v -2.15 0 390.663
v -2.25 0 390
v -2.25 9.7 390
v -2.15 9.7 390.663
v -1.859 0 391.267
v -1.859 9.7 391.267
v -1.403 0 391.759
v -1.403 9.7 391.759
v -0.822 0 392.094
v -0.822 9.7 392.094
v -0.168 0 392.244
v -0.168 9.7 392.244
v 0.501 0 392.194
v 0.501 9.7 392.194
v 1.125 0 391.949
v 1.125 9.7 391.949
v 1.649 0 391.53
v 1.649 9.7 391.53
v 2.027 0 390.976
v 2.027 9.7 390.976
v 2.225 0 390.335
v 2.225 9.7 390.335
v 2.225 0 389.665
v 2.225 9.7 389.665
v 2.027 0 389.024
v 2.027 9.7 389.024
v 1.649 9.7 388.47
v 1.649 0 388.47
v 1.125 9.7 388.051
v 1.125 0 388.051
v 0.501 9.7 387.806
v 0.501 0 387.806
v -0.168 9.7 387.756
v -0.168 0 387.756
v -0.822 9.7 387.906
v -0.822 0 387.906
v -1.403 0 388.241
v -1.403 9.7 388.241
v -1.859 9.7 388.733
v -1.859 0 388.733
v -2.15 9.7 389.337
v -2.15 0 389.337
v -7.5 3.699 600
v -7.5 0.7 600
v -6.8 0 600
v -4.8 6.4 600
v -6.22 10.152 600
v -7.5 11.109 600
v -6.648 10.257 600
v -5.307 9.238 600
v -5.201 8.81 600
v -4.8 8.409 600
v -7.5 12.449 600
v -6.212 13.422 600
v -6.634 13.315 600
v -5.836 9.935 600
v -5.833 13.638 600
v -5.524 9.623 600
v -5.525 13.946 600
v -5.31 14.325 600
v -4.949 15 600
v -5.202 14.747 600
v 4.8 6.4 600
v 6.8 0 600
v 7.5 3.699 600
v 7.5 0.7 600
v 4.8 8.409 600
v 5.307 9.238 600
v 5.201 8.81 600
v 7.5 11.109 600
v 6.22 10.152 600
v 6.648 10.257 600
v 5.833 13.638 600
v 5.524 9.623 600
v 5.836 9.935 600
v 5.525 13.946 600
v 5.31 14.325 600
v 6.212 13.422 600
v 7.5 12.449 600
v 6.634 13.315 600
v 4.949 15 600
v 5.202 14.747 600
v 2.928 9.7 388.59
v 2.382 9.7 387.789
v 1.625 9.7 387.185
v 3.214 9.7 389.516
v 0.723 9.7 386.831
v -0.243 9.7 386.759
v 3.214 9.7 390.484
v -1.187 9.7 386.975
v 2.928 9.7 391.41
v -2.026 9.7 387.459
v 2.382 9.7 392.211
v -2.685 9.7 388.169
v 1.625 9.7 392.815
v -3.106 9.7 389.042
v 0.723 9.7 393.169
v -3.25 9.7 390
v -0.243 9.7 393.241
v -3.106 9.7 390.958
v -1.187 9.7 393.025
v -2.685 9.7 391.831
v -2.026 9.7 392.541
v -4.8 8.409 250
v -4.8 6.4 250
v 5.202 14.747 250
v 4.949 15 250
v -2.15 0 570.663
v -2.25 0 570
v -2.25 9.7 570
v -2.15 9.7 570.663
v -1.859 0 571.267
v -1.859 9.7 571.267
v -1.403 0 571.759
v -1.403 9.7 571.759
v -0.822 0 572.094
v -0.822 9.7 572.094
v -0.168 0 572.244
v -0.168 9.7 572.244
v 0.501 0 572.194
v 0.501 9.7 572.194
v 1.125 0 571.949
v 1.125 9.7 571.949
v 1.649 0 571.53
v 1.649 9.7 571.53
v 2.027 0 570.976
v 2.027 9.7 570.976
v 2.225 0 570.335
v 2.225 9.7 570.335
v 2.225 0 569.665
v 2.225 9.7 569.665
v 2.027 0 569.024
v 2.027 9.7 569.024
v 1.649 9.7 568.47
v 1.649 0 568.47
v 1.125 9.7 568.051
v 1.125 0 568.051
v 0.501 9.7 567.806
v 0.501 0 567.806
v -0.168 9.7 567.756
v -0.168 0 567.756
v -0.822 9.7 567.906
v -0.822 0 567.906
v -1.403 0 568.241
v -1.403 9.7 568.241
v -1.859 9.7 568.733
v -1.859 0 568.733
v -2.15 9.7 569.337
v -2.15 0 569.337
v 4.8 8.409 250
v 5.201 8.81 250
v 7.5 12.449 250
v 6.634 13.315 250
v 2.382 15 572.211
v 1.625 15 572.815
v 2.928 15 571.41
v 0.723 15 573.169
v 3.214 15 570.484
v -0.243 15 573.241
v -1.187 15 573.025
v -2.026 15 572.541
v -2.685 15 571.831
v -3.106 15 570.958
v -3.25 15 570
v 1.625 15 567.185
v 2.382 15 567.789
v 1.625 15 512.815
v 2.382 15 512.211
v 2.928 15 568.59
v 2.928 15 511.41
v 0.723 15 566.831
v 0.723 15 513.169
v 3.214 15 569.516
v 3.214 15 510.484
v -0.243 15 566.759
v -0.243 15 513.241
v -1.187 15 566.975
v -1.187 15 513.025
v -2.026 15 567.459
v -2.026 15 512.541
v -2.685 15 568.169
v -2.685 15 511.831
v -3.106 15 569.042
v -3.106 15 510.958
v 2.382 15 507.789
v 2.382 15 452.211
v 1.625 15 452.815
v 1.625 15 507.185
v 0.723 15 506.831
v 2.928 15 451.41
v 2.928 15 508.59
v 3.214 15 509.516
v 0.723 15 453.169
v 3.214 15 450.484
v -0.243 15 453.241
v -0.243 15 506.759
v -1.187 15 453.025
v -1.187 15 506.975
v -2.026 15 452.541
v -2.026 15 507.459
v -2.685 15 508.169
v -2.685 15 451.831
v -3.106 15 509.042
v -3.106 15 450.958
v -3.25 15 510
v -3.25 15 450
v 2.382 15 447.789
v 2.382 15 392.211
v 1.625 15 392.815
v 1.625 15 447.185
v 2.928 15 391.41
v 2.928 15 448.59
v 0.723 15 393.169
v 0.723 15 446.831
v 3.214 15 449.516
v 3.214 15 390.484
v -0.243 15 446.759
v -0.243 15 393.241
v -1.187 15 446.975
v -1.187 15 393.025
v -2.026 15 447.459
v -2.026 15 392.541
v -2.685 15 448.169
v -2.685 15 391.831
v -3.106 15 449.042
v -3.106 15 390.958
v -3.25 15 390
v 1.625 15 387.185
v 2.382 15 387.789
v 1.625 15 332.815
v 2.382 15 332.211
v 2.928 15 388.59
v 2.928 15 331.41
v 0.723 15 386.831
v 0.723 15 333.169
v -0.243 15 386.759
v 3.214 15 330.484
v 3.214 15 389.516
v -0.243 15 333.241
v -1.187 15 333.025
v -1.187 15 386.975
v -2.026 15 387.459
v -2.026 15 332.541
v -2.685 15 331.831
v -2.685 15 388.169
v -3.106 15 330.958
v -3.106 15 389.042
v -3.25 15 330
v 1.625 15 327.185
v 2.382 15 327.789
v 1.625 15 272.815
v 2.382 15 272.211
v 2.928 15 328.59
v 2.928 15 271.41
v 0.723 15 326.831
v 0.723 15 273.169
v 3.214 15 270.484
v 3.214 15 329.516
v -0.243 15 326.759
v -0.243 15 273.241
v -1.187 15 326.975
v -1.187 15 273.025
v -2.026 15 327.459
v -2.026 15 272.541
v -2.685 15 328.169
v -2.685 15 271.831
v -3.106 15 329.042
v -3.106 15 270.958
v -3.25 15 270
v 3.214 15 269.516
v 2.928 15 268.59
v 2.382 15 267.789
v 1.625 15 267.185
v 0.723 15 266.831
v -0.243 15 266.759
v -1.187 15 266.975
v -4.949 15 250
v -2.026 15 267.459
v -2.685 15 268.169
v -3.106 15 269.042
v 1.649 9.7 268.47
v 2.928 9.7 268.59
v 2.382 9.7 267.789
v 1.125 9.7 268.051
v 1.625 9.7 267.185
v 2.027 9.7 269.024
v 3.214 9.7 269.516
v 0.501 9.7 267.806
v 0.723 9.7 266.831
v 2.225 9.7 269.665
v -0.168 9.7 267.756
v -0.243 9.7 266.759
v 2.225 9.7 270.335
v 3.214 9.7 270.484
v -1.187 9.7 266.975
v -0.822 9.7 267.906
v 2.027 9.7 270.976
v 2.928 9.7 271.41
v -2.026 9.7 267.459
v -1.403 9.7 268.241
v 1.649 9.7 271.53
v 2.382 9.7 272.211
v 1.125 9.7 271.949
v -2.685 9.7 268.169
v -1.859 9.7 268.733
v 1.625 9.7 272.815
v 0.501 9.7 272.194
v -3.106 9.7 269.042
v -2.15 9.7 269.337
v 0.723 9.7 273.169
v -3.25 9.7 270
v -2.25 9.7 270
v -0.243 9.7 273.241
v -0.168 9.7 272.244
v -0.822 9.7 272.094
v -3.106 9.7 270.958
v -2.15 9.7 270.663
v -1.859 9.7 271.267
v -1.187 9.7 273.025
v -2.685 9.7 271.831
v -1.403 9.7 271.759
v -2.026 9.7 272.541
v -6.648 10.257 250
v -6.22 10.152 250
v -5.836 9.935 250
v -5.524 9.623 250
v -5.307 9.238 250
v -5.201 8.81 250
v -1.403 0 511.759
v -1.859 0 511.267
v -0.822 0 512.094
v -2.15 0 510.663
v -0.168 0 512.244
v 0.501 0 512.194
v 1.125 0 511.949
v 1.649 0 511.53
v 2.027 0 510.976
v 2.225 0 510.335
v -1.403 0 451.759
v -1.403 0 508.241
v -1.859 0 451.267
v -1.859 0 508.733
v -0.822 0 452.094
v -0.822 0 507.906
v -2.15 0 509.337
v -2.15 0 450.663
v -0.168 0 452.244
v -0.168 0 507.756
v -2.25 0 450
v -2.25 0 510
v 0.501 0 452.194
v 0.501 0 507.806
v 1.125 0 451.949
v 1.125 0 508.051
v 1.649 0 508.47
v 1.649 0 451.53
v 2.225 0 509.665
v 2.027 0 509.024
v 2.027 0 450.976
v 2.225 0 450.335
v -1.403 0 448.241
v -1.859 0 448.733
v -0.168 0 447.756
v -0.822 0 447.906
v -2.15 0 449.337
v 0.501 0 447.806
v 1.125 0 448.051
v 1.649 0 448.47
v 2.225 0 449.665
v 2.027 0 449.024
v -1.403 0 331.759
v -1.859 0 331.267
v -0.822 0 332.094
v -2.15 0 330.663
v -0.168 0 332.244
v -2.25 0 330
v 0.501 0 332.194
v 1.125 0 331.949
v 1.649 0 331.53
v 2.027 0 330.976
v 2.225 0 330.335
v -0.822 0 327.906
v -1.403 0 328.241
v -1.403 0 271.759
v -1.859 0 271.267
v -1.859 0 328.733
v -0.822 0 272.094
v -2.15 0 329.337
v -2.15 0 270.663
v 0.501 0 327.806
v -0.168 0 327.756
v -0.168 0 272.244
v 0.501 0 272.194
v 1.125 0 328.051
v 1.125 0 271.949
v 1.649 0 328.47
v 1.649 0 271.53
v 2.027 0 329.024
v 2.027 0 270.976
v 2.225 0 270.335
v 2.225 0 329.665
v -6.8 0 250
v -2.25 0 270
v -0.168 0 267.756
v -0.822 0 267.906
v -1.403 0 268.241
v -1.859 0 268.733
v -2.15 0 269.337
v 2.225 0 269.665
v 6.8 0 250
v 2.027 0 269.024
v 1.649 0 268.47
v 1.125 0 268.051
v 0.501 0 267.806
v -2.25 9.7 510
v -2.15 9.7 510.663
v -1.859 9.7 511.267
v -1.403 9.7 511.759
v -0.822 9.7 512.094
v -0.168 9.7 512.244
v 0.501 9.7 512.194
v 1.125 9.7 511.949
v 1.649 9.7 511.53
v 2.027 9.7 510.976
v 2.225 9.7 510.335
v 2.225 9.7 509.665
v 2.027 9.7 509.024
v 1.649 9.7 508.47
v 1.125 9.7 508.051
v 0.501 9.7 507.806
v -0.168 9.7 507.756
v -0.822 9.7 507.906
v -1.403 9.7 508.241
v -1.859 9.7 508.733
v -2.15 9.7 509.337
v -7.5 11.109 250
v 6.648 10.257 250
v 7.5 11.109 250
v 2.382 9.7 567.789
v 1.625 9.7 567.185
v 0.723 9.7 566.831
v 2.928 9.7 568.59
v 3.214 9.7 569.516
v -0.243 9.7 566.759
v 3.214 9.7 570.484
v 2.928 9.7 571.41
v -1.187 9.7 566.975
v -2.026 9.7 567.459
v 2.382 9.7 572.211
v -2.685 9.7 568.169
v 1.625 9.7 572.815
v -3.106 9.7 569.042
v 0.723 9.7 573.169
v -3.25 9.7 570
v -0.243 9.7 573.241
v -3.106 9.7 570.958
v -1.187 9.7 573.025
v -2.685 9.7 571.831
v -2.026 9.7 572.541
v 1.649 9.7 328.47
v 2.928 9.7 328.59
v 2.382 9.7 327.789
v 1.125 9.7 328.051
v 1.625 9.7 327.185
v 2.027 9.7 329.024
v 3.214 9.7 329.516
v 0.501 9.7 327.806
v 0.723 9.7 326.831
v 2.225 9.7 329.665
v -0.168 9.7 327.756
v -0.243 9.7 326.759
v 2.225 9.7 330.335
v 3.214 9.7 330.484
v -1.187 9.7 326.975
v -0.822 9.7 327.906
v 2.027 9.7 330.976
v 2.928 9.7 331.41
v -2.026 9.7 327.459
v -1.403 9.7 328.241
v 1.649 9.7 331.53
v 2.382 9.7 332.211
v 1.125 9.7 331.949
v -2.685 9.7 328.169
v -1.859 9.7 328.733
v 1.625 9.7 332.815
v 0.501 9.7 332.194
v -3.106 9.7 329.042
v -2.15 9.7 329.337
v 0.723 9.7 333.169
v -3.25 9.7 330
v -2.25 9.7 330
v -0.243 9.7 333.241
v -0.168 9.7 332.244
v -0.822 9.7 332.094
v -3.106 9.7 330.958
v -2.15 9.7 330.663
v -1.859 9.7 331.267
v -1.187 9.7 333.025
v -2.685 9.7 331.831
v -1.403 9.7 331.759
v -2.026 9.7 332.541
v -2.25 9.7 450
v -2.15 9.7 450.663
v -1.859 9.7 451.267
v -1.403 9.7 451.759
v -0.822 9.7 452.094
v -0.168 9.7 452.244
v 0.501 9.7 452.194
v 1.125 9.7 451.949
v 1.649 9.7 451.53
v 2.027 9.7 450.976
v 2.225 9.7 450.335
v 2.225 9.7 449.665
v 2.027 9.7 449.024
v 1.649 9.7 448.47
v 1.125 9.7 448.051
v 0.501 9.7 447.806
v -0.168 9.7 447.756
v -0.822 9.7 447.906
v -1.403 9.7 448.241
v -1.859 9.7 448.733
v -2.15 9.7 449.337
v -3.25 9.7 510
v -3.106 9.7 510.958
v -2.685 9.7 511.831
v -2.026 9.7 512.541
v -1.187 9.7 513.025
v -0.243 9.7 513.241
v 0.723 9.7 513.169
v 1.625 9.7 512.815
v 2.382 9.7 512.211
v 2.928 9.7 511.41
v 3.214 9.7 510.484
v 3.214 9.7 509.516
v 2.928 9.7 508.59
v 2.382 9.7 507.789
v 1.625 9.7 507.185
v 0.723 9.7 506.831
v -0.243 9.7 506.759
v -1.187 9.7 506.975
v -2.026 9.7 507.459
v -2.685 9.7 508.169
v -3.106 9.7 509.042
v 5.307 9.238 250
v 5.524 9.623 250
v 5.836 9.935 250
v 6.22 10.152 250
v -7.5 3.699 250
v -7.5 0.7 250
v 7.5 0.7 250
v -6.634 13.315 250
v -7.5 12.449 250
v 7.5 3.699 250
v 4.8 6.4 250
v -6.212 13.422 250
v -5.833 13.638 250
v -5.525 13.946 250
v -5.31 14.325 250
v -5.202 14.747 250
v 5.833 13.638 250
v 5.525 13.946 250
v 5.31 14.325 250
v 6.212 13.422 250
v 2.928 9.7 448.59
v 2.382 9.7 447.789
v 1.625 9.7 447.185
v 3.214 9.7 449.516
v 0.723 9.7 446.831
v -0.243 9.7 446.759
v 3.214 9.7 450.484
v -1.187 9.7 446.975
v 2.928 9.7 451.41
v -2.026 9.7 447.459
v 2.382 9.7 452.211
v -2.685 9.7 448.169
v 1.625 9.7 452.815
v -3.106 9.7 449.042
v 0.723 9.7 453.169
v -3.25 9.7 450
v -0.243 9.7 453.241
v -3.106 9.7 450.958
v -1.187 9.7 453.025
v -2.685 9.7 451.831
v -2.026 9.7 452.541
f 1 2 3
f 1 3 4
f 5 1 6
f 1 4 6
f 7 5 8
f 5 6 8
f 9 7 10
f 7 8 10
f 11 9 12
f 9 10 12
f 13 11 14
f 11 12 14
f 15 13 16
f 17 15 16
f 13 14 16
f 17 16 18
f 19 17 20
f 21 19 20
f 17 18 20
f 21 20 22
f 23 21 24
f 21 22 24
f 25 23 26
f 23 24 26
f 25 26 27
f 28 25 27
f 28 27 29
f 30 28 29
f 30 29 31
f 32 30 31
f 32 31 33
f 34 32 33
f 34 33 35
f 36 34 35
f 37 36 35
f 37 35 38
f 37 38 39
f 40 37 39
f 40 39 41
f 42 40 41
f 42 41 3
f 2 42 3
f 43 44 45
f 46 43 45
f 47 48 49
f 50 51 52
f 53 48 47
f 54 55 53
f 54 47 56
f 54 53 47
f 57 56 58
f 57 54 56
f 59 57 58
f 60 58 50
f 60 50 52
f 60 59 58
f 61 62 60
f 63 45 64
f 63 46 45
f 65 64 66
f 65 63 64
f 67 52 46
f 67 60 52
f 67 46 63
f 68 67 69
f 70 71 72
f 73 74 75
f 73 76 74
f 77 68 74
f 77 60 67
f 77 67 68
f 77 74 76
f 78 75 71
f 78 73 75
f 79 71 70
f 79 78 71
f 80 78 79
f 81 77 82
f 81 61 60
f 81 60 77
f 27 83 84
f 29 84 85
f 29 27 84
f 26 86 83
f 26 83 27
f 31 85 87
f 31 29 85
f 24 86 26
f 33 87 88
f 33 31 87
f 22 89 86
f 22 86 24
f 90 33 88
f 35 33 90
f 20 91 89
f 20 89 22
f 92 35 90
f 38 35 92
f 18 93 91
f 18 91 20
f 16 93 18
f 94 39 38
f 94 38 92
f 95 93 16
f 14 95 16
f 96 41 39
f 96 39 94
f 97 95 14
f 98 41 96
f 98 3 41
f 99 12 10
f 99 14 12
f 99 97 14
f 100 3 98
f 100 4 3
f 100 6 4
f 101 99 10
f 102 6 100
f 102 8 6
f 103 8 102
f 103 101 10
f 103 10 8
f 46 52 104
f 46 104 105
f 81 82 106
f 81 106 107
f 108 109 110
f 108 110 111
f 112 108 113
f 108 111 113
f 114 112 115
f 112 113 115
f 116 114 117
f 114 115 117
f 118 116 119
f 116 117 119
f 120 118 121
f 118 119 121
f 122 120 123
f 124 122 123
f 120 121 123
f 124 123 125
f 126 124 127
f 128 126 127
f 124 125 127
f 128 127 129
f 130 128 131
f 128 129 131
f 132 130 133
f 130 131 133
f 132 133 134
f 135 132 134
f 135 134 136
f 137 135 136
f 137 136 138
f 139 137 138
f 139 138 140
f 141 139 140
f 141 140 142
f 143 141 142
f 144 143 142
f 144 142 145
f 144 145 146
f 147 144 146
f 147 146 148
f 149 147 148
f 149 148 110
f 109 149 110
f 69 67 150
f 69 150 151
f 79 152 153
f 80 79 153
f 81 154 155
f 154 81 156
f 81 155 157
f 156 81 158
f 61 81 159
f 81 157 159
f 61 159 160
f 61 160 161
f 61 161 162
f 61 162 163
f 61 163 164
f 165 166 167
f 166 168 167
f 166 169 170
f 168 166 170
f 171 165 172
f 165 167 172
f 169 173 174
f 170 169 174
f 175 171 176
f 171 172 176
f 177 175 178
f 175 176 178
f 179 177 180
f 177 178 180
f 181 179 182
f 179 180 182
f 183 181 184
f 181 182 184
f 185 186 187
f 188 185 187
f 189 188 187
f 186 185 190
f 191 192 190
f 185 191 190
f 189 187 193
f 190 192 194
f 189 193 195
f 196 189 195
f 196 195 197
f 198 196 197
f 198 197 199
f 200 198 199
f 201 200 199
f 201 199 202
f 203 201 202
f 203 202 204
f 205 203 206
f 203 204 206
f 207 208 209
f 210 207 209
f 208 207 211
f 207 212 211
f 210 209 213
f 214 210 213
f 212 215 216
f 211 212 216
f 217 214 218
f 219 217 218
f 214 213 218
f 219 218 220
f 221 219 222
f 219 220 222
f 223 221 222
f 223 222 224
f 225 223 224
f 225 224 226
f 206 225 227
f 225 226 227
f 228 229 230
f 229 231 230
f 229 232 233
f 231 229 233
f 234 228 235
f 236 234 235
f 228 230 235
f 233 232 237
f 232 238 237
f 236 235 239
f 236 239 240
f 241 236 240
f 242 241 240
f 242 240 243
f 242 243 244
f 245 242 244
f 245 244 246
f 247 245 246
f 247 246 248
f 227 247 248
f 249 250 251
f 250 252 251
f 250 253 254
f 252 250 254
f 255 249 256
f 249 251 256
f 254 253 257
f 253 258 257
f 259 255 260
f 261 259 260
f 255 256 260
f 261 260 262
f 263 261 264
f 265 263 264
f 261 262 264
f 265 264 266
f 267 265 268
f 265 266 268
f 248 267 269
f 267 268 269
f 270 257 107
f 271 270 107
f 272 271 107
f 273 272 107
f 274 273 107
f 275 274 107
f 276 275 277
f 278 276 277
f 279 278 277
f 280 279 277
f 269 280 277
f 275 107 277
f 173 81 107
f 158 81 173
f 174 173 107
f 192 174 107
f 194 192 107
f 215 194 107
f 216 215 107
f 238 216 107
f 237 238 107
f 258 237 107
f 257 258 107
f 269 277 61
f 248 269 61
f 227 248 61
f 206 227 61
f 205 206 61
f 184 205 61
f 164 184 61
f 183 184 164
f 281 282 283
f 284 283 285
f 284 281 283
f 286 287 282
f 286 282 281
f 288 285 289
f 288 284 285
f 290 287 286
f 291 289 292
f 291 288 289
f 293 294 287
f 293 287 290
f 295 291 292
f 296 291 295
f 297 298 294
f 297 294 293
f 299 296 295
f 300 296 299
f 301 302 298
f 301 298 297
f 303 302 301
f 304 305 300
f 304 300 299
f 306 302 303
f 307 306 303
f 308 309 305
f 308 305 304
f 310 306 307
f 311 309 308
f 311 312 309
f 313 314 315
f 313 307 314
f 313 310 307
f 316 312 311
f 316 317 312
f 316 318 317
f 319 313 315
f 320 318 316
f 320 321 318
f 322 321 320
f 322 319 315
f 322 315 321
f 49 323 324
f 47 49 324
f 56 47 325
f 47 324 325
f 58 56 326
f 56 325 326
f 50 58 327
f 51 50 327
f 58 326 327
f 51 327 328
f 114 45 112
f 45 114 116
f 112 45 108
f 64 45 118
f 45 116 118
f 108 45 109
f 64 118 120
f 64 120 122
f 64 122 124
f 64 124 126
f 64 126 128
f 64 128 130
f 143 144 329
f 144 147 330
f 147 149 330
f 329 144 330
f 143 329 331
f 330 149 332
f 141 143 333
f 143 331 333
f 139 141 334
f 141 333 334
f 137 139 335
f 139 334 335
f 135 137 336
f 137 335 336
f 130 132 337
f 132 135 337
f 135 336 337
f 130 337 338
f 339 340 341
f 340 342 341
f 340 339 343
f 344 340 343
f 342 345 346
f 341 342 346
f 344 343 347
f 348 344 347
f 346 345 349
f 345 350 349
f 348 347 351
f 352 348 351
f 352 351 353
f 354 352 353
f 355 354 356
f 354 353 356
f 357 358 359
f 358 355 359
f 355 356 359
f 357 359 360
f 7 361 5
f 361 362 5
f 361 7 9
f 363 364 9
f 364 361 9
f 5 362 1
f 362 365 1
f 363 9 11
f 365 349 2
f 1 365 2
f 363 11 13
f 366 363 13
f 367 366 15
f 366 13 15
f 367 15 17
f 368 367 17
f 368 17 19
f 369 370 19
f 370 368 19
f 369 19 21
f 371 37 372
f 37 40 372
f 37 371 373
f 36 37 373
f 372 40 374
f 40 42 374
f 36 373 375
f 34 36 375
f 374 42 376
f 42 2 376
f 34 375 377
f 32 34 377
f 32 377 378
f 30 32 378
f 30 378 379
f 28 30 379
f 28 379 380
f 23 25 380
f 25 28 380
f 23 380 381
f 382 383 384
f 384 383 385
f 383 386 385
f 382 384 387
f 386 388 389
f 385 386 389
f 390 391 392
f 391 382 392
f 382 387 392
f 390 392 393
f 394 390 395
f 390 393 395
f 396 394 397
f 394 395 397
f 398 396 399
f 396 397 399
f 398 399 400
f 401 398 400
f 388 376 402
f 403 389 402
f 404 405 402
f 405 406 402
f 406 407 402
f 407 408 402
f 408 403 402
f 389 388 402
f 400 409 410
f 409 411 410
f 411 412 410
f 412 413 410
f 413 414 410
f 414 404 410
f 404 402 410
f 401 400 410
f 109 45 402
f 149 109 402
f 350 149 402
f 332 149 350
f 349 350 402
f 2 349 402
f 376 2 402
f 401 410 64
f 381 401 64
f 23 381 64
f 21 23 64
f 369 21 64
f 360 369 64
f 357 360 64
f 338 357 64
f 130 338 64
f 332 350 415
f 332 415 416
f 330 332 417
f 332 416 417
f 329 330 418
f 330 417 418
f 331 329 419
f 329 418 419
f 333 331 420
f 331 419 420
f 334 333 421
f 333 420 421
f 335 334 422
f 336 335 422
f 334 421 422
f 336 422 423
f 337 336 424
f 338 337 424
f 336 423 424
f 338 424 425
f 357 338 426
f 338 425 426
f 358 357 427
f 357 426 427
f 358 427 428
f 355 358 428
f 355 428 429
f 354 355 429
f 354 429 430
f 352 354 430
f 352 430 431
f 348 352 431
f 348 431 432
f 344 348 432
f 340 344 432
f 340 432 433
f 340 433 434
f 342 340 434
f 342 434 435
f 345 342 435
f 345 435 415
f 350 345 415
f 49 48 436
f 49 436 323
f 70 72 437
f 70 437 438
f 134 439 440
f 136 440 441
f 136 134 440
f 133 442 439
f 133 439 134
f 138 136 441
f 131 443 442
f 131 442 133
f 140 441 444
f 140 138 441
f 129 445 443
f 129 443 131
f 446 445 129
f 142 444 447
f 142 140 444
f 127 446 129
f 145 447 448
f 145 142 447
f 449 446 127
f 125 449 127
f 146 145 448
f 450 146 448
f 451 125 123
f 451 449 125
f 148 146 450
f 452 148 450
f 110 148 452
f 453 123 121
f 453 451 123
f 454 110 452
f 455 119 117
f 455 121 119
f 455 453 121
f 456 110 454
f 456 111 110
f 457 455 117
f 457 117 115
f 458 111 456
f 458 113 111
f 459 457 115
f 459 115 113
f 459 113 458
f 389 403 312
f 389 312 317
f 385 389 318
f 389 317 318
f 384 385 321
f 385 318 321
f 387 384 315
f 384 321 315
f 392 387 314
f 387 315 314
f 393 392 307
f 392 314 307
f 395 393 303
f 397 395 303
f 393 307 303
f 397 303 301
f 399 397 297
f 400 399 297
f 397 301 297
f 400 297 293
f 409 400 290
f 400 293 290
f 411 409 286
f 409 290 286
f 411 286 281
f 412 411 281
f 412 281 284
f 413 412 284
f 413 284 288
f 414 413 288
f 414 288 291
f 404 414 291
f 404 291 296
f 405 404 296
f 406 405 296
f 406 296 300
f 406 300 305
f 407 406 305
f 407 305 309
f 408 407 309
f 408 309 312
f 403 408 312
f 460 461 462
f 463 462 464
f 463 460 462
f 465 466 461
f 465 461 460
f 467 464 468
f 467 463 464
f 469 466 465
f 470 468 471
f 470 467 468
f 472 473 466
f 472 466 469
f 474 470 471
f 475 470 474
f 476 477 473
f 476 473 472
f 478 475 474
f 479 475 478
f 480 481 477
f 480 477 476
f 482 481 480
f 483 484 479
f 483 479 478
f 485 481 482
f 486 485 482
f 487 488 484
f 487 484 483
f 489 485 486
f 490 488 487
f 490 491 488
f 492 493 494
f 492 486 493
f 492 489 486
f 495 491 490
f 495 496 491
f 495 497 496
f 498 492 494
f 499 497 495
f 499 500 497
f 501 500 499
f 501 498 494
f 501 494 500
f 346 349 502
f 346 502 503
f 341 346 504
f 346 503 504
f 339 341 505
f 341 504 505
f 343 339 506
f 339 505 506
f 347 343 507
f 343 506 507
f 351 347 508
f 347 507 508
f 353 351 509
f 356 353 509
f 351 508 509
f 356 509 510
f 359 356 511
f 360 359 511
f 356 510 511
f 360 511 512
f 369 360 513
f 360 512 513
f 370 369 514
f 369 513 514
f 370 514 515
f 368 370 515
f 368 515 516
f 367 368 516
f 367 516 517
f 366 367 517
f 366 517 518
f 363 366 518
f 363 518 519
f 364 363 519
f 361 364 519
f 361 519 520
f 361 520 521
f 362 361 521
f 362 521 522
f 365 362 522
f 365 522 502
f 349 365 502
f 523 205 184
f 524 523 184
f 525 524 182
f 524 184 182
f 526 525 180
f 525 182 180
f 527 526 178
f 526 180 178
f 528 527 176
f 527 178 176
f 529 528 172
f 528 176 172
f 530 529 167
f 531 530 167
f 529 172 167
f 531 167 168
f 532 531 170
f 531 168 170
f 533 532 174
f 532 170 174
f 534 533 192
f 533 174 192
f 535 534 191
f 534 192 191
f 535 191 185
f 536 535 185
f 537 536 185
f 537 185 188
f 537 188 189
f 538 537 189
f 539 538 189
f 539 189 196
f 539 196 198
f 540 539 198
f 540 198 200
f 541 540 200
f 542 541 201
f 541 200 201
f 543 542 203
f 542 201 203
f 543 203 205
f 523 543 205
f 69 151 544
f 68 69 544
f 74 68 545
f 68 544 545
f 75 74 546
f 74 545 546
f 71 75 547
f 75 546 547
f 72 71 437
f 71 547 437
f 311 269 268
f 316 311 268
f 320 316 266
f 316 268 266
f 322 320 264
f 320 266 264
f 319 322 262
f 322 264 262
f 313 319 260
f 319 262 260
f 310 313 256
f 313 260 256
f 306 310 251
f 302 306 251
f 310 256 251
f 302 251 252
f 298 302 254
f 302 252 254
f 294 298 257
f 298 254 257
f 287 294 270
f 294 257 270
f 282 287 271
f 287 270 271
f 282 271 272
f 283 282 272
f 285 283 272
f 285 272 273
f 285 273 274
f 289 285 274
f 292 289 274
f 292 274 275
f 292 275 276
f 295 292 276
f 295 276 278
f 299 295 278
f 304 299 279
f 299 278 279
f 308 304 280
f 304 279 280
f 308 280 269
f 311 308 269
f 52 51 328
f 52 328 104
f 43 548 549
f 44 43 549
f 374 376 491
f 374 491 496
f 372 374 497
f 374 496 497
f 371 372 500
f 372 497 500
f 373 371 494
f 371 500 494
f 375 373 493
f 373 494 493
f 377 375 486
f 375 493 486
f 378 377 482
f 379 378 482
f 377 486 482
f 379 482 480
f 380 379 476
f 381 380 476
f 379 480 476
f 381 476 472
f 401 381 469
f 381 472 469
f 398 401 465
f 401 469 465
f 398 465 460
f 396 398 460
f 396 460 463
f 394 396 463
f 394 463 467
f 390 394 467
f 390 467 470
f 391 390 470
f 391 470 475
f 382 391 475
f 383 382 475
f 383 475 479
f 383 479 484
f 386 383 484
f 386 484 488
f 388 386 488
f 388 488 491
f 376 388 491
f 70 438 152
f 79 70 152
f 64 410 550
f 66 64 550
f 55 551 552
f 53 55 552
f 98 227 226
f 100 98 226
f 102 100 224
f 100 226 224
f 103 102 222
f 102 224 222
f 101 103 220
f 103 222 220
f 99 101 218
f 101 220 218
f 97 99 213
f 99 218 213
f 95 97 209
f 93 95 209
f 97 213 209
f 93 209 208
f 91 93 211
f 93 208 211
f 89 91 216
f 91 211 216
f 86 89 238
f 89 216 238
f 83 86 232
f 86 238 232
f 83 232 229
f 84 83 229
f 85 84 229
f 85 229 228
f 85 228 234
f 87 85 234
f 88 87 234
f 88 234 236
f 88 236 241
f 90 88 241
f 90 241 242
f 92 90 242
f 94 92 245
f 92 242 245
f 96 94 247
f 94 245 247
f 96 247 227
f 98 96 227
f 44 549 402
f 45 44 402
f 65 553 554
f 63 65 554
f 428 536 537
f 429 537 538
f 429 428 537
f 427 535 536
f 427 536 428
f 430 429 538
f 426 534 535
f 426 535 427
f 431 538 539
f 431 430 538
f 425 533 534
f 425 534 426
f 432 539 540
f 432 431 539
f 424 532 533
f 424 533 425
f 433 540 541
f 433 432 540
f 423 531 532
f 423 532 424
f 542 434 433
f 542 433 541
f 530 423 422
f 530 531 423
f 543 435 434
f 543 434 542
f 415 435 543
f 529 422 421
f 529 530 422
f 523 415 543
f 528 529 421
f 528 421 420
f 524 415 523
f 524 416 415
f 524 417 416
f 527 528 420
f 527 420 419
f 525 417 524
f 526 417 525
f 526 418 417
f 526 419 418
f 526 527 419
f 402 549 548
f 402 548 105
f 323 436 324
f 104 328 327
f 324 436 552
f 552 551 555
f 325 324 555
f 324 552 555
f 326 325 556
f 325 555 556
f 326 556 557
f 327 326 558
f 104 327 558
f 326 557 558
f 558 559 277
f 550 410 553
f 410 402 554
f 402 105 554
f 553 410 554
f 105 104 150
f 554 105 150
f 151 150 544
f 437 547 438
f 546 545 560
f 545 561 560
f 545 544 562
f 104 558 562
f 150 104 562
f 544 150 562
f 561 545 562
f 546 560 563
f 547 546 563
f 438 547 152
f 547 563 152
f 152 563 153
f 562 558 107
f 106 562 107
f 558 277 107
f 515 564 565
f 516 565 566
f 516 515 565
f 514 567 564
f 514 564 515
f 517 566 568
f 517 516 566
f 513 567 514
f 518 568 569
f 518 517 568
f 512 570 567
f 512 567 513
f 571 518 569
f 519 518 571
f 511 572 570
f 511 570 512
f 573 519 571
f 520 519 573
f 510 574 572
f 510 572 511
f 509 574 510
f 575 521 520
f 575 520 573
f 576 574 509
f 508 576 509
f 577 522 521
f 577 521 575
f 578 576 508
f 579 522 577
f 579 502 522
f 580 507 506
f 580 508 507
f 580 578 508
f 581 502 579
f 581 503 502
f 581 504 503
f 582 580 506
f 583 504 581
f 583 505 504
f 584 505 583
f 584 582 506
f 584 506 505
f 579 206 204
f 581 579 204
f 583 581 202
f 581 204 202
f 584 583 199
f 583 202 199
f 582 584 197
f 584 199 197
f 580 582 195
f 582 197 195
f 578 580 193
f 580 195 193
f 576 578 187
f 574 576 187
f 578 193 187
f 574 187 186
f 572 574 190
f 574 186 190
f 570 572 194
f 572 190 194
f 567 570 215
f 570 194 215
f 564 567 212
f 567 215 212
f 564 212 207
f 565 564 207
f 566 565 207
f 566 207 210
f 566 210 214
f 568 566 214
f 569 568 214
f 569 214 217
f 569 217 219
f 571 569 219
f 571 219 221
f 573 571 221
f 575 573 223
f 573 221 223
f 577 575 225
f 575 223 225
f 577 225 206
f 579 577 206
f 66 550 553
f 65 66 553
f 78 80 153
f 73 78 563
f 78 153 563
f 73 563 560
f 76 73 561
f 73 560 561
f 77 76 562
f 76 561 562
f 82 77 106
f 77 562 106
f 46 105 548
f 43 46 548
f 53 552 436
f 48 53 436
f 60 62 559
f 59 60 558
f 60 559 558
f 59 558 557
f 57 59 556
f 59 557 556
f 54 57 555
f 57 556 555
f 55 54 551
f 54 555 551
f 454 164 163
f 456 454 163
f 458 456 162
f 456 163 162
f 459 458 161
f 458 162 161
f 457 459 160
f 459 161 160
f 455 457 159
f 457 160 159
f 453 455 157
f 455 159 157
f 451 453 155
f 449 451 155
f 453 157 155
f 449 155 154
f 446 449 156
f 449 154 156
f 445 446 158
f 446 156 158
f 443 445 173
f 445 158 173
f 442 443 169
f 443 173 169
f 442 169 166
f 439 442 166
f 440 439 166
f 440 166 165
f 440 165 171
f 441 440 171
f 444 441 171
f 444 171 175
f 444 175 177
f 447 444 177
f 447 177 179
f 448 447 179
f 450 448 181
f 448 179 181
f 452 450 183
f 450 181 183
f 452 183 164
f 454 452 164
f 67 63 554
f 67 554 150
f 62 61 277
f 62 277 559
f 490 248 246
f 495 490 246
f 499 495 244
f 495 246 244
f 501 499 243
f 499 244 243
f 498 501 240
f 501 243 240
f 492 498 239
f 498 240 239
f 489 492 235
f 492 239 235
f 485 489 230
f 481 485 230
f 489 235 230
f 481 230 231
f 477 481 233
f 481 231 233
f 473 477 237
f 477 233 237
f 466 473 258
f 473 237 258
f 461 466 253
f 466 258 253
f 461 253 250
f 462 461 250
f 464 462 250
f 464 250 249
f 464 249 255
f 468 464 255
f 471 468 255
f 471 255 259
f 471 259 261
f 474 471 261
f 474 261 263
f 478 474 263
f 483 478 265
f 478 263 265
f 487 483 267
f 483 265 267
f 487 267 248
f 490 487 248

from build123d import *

# Parameters (mm, degrees)
EXTRUDE_1_DEPTH     = 600
SKETCH_2_R          = 3.25
CUT_EXTRUDE_1_DEPTH = 5.3
SKETCH_3_R          = 2.25
CUT_EXTRUDE_2_DEPTH = 601.125270256
SKETCH1_W           = 15
SKETCH1_H           = 250
CUT_EXTRUDE1_DEPTH  = 100


with BuildPart() as part:
    # Model → Бобышка-Вытянуть1 (new body)
    with BuildSketch(Plane.XY):
        with BuildLine():
            Line((6.8, 0), (7.5, 0.7))
            Line((7.5, 0.7), (7.5, 3.6994391))
            Line((7.5, 3.6994391), (4.7998047, 6.3996344))
            Line((4.7998047, 6.3996344), (4.7998047, 8.409149262))
            Line((4.7998047, 8.409149262), (5.20075838, 8.810103152))
            ThreePointArc((5.20075838, 8.810103152), (5.668922208, 9.789261508), (6.648080611, 10.257425237))
            Line((6.648080611, 10.257425237), (7.5, 11.109345046))
            Line((7.5, 11.109345046), (7.5, 12.449454443))
            Line((7.5, 12.449454443), (6.634490912, 13.314965186))
            ThreePointArc((6.634490912, 13.314965186), (5.668922174, 13.781617126), (5.202270193, 14.747185846))
            Line((5.202270193, 14.747185846), (4.949456226, 15))
            Line((4.949456226, 15), (-4.949456226, 15))
            Line((-4.949456226, 15), (-5.202270193, 14.747185846))
            ThreePointArc((-5.202270193, 14.747185846), (-5.668922174, 13.781617126), (-6.634490912, 13.314965186))
            Line((-6.634490912, 13.314965186), (-7.5, 12.449454443))
            Line((-7.5, 12.449454443), (-7.5, 11.109345046))
            Line((-7.5, 11.109345046), (-6.648080611, 10.257425238))
            ThreePointArc((-6.648080611, 10.257425238), (-5.668922208, 9.789261508), (-5.20075838, 8.810103152))
            Line((-5.20075838, 8.810103152), (-4.7998047, 8.409149262))
            Line((-4.7998047, 8.409149262), (-4.7998047, 6.3996344))
            Line((-4.7998047, 6.3996344), (-7.5, 3.6994391))
            Line((-7.5, 3.6994391), (-7.5, 0.7))
            Line((-7.5, 0.7), (-6.8, 0))
            Line((-6.8, 0), (6.8, 0))
        make_face()
    extrude(amount=EXTRUDE_1_DEPTH)

    # Эскиз2 → Вырез-Вытянуть1 (cut)
    with BuildSketch(Plane(origin=(0, 15, 0), x_dir=(1, 0, 0), z_dir=(0, 1, 0))):
        with Locations(Location((0, -30, 0), (0, 0, 180))):
            Circle(SKETCH_2_R)
        with Locations(Location((0, -90, 0), (0, 0, 180))):
            Circle(SKETCH_2_R)
        with Locations(Location((0, -150, 0), (0, 0, 180))):
            Circle(SKETCH_2_R)
        with Locations(Location((0, -210, 0), (0, 0, 180))):
            Circle(SKETCH_2_R)
        with Locations(Location((0, -270, 0), (0, 0, 180))):
            Circle(SKETCH_2_R)
        with Locations(Location((0, -330, 0), (0, 0, 180))):
            Circle(SKETCH_2_R)
        with Locations(Location((0, -390, 0), (0, 0, 180))):
            Circle(SKETCH_2_R)
        with Locations(Location((0, -450, 0), (0, 0, 180))):
            Circle(SKETCH_2_R)
        with Locations(Location((0, -510, 0), (0, 0, 180))):
            Circle(SKETCH_2_R)
        with Locations(Location((0, -570, 0), (0, 0, 180))):
            Circle(SKETCH_2_R)
    extrude(amount=-CUT_EXTRUDE_1_DEPTH, mode=Mode.SUBTRACT)

    # Эскиз3 → Вырез-Вытянуть2 (cut, through all)
    with BuildSketch(Plane(origin=(0, 9.7, 0), x_dir=(1, 0, 0), z_dir=(0, 1, 0))):
        with Locations(Location((0, -30, 0), (0, 0, 180))):
            Circle(SKETCH_3_R)
        with Locations(Location((0, -90, 0), (0, 0, 180))):
            Circle(SKETCH_3_R)
        with Locations(Location((0, -150, 0), (0, 0, 180))):
            Circle(SKETCH_3_R)
        with Locations(Location((0, -210, 0), (0, 0, 180))):
            Circle(SKETCH_3_R)
        with Locations(Location((0, -270, 0), (0, 0, 180))):
            Circle(SKETCH_3_R)
        with Locations(Location((0, -330, 0), (0, 0, 180))):
            Circle(SKETCH_3_R)
        with Locations(Location((0, -390, 0), (0, 0, 180))):
            Circle(SKETCH_3_R)
        with Locations(Location((0, -450, 0), (0, 0, 180))):
            Circle(SKETCH_3_R)
        with Locations(Location((0, -510, 0), (0, 0, 180))):
            Circle(SKETCH_3_R)
        with Locations(Location((0, -570, 0), (0, 0, 180))):
            Circle(SKETCH_3_R)
    extrude(amount=-CUT_EXTRUDE_2_DEPTH, mode=Mode.SUBTRACT)

    # Sketch1 → Cut-Extrude1 (cut)
    with BuildSketch(Plane(origin=(0, 15, 0), x_dir=(1, 0, 0), z_dir=(0, 1, 0))):
        with Locations((0, -125)):
            Rectangle(SKETCH1_W, SKETCH1_H)
    extrude(amount=-CUT_EXTRUDE1_DEPTH, mode=Mode.SUBTRACT)


solid = part.part
